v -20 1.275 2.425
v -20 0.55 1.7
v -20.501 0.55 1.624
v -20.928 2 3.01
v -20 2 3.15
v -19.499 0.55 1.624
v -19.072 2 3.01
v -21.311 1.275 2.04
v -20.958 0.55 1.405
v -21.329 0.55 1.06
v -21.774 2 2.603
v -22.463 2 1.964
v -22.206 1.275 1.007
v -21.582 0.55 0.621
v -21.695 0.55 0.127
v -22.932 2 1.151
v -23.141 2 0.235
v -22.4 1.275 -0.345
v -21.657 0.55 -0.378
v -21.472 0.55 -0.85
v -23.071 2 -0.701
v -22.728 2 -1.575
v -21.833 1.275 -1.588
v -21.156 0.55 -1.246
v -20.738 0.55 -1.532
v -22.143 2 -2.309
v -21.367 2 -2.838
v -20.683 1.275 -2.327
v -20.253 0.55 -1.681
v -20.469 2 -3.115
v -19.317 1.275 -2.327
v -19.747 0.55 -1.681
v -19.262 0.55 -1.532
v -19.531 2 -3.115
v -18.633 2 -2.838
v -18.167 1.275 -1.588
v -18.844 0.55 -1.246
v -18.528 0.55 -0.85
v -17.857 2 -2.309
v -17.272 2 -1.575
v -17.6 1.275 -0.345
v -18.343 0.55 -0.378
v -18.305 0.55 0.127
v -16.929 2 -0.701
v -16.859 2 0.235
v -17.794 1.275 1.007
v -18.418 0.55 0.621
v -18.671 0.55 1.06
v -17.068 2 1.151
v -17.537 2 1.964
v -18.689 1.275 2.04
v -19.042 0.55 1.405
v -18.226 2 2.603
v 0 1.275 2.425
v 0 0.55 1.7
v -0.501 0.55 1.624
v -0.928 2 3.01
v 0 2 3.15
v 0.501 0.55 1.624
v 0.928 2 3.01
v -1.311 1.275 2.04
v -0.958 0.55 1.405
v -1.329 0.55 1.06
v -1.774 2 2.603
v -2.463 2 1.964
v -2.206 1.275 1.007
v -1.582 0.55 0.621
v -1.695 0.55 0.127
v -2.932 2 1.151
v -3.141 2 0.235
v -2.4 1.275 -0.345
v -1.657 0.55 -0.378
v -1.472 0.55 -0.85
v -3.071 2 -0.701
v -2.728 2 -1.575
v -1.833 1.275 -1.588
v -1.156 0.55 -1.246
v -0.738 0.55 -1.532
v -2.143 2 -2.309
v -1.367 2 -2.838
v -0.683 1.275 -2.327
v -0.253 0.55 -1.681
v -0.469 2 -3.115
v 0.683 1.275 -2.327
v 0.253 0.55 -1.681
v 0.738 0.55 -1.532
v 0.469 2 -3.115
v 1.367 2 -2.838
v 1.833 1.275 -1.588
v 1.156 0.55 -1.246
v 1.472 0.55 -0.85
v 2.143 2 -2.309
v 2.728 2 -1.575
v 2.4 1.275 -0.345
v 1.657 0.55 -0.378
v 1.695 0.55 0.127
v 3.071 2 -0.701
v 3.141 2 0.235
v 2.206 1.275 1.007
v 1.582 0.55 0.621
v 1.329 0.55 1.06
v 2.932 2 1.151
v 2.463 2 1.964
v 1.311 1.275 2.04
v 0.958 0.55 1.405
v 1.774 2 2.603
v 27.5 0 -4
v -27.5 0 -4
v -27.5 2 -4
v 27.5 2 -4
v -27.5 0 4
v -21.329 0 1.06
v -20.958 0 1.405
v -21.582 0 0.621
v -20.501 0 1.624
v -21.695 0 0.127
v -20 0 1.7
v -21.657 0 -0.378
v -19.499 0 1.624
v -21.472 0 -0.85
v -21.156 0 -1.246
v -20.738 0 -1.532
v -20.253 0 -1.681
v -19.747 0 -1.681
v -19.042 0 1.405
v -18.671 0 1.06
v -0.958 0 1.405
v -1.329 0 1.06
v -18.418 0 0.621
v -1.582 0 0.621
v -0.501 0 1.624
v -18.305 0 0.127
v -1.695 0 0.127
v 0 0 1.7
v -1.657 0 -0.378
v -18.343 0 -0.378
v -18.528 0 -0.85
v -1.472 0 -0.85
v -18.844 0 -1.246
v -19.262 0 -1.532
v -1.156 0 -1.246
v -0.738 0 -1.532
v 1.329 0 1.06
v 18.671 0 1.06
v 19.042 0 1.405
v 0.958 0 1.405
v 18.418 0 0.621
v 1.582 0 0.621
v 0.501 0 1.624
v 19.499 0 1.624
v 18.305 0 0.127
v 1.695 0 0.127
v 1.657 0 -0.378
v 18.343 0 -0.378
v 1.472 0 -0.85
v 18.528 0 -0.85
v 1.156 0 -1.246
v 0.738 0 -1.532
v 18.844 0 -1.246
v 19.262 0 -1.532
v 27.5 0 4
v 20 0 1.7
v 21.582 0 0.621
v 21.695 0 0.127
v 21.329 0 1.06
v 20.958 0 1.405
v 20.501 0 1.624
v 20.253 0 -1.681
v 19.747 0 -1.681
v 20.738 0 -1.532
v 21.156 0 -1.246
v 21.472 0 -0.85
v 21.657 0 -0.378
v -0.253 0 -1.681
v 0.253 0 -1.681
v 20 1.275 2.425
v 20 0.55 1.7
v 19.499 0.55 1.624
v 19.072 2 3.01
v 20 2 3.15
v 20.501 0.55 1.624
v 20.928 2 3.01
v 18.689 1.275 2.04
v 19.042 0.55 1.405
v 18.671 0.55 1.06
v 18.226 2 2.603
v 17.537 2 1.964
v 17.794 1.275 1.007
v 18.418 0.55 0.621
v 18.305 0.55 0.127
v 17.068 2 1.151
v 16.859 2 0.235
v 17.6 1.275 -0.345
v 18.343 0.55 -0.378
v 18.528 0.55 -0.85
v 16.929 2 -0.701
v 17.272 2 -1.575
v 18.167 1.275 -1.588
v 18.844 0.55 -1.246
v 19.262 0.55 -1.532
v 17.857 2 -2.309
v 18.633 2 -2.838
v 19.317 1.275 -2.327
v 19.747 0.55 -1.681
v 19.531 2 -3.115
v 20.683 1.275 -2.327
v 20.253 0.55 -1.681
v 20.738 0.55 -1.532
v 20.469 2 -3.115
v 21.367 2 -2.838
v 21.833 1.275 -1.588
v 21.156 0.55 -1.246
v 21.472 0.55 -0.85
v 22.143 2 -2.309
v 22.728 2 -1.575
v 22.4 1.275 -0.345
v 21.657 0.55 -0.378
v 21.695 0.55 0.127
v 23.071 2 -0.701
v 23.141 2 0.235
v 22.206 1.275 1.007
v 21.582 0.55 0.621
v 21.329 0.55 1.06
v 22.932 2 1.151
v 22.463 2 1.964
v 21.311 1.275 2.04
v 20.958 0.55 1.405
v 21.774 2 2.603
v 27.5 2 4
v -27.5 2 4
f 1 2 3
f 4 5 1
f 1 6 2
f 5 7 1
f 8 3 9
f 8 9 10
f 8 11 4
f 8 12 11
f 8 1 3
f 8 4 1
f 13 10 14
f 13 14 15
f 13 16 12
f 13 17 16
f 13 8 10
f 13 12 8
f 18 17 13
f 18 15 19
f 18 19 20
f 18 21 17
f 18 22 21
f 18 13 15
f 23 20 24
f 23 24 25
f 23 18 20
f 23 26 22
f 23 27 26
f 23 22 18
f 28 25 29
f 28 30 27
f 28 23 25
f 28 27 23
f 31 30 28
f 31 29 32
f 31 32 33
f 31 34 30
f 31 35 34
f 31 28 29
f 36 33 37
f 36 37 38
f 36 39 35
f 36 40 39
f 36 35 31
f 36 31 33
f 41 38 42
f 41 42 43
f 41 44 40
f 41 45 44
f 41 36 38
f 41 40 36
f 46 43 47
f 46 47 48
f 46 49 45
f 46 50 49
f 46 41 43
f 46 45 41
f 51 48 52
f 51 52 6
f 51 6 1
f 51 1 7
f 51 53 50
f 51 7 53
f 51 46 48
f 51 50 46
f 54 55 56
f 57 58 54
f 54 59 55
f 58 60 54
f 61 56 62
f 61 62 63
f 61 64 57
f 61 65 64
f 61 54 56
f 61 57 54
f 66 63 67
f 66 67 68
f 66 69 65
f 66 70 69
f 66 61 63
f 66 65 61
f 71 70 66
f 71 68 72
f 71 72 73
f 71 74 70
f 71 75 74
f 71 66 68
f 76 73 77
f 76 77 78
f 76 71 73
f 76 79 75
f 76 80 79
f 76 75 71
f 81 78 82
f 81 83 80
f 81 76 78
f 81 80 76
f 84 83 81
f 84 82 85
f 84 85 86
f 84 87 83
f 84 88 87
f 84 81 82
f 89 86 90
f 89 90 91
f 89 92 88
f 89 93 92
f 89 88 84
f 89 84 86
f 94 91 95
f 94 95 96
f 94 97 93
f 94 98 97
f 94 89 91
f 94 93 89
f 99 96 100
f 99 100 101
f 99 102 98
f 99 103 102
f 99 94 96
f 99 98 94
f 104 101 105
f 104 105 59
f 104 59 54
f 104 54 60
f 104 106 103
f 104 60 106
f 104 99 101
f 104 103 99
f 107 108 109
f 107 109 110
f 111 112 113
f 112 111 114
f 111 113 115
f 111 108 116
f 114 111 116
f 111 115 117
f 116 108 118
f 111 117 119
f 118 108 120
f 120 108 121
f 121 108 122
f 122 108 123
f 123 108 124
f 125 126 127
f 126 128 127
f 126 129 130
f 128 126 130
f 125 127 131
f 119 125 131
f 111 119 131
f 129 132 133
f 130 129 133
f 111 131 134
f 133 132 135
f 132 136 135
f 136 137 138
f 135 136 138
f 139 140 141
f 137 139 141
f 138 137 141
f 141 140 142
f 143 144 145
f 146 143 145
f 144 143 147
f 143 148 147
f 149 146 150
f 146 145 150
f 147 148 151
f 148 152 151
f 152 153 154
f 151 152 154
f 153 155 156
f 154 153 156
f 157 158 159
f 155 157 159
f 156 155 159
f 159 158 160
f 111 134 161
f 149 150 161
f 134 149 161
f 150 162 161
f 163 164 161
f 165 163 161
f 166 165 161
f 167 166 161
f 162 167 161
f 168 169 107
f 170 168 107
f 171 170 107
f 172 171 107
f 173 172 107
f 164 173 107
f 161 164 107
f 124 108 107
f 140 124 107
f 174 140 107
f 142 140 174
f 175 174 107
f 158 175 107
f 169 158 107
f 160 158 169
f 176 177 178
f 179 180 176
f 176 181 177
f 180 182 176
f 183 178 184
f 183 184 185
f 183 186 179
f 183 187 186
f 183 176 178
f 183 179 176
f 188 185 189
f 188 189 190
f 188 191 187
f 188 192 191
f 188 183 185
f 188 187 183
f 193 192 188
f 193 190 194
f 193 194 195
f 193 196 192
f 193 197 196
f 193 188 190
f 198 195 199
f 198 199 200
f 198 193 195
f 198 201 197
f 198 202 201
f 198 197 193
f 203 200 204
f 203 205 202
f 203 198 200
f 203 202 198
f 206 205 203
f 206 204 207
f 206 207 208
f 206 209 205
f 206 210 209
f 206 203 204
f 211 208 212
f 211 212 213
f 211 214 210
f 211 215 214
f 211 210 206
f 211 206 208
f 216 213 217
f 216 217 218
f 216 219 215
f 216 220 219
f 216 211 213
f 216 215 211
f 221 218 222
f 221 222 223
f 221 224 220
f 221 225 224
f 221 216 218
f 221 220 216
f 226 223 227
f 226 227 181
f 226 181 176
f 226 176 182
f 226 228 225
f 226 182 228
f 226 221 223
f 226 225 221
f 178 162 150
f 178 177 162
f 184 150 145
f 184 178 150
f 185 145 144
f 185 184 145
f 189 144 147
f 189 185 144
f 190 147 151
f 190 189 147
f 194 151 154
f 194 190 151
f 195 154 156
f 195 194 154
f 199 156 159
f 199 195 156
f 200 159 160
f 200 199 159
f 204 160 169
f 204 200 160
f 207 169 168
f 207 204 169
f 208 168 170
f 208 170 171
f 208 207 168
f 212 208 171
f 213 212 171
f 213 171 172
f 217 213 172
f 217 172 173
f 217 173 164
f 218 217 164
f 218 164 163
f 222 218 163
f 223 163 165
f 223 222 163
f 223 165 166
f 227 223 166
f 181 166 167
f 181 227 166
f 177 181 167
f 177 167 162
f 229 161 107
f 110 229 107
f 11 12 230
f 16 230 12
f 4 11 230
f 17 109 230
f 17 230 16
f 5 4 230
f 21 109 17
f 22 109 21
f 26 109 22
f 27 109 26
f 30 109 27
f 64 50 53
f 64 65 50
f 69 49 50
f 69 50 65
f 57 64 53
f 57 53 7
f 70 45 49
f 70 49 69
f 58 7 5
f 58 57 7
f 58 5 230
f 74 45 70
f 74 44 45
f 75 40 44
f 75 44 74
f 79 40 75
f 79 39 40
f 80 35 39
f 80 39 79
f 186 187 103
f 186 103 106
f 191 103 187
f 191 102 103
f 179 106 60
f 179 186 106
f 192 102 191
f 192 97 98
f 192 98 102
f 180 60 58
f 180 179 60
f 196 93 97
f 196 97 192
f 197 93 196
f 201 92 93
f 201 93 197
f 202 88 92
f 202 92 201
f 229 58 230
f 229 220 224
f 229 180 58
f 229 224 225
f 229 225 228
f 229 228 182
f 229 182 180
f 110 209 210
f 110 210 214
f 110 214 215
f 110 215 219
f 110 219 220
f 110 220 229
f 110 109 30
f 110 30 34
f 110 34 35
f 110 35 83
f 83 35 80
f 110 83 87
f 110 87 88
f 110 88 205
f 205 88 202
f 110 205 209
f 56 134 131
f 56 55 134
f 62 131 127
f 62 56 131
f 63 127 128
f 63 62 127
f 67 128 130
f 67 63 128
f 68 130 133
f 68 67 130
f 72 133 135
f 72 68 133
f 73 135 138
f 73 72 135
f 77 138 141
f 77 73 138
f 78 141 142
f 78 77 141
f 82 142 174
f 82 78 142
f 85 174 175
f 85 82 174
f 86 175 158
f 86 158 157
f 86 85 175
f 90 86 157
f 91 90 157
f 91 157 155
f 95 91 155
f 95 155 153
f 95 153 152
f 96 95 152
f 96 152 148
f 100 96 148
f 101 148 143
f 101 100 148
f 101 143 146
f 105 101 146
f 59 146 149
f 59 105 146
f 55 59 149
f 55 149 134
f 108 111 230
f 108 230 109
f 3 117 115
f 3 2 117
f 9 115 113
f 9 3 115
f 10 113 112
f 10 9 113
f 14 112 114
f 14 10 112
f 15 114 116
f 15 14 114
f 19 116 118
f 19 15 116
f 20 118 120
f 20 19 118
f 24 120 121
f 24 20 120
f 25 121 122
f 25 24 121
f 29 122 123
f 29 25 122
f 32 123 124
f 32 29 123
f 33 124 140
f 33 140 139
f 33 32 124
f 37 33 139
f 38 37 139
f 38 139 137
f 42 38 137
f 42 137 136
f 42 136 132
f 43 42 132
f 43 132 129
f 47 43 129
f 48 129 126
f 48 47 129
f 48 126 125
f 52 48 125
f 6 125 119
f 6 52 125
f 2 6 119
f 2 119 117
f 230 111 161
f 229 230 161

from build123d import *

# Parameters (mm, degrees)
SKETCH1_W           = 55
SKETCH1_H           = 8
BOSS_EXTRUDE1_DEPTH = 2
LPATTERN1_COUNT     = 3
LPATTERN1_PITCH     = 20


with BuildPart() as part:
    # Sketch1 → Boss-Extrude1 (new body)
    with BuildSketch(Plane(origin=(0, 0, 0), x_dir=(1, 0, 0), z_dir=(0, 1, 0))):
        Rectangle(SKETCH1_W, SKETCH1_H)
    extrude(amount=BOSS_EXTRUDE1_DEPTH)

    # Sketch3 → CSK for M3 Countersunk Flat Head1 (revolve, cut)
    with BuildSketch(Plane(origin=(-20, 2, 0), x_dir=(0, 0, 1), z_dir=(1, 0, 0))):
        Polygon((0, 0), (0, 2), (1.7, 2), (1.7, 1.45), (3.15, 0), align=None)
    csk_for_m3_countersunk_flat_head1 = revolve(axis=Axis((-20, 8.35, 0), (0, -1, 0)), mode=Mode.SUBTRACT)

    # LPattern1: CSK for M3 Countersunk Flat Head1 ×3
    with Locations(*[(i * LPATTERN1_PITCH, 0, 0) for i in range(1, LPATTERN1_COUNT)]):
        add(csk_for_m3_countersunk_flat_head1, mode=Mode.SUBTRACT)


solid = part.part
